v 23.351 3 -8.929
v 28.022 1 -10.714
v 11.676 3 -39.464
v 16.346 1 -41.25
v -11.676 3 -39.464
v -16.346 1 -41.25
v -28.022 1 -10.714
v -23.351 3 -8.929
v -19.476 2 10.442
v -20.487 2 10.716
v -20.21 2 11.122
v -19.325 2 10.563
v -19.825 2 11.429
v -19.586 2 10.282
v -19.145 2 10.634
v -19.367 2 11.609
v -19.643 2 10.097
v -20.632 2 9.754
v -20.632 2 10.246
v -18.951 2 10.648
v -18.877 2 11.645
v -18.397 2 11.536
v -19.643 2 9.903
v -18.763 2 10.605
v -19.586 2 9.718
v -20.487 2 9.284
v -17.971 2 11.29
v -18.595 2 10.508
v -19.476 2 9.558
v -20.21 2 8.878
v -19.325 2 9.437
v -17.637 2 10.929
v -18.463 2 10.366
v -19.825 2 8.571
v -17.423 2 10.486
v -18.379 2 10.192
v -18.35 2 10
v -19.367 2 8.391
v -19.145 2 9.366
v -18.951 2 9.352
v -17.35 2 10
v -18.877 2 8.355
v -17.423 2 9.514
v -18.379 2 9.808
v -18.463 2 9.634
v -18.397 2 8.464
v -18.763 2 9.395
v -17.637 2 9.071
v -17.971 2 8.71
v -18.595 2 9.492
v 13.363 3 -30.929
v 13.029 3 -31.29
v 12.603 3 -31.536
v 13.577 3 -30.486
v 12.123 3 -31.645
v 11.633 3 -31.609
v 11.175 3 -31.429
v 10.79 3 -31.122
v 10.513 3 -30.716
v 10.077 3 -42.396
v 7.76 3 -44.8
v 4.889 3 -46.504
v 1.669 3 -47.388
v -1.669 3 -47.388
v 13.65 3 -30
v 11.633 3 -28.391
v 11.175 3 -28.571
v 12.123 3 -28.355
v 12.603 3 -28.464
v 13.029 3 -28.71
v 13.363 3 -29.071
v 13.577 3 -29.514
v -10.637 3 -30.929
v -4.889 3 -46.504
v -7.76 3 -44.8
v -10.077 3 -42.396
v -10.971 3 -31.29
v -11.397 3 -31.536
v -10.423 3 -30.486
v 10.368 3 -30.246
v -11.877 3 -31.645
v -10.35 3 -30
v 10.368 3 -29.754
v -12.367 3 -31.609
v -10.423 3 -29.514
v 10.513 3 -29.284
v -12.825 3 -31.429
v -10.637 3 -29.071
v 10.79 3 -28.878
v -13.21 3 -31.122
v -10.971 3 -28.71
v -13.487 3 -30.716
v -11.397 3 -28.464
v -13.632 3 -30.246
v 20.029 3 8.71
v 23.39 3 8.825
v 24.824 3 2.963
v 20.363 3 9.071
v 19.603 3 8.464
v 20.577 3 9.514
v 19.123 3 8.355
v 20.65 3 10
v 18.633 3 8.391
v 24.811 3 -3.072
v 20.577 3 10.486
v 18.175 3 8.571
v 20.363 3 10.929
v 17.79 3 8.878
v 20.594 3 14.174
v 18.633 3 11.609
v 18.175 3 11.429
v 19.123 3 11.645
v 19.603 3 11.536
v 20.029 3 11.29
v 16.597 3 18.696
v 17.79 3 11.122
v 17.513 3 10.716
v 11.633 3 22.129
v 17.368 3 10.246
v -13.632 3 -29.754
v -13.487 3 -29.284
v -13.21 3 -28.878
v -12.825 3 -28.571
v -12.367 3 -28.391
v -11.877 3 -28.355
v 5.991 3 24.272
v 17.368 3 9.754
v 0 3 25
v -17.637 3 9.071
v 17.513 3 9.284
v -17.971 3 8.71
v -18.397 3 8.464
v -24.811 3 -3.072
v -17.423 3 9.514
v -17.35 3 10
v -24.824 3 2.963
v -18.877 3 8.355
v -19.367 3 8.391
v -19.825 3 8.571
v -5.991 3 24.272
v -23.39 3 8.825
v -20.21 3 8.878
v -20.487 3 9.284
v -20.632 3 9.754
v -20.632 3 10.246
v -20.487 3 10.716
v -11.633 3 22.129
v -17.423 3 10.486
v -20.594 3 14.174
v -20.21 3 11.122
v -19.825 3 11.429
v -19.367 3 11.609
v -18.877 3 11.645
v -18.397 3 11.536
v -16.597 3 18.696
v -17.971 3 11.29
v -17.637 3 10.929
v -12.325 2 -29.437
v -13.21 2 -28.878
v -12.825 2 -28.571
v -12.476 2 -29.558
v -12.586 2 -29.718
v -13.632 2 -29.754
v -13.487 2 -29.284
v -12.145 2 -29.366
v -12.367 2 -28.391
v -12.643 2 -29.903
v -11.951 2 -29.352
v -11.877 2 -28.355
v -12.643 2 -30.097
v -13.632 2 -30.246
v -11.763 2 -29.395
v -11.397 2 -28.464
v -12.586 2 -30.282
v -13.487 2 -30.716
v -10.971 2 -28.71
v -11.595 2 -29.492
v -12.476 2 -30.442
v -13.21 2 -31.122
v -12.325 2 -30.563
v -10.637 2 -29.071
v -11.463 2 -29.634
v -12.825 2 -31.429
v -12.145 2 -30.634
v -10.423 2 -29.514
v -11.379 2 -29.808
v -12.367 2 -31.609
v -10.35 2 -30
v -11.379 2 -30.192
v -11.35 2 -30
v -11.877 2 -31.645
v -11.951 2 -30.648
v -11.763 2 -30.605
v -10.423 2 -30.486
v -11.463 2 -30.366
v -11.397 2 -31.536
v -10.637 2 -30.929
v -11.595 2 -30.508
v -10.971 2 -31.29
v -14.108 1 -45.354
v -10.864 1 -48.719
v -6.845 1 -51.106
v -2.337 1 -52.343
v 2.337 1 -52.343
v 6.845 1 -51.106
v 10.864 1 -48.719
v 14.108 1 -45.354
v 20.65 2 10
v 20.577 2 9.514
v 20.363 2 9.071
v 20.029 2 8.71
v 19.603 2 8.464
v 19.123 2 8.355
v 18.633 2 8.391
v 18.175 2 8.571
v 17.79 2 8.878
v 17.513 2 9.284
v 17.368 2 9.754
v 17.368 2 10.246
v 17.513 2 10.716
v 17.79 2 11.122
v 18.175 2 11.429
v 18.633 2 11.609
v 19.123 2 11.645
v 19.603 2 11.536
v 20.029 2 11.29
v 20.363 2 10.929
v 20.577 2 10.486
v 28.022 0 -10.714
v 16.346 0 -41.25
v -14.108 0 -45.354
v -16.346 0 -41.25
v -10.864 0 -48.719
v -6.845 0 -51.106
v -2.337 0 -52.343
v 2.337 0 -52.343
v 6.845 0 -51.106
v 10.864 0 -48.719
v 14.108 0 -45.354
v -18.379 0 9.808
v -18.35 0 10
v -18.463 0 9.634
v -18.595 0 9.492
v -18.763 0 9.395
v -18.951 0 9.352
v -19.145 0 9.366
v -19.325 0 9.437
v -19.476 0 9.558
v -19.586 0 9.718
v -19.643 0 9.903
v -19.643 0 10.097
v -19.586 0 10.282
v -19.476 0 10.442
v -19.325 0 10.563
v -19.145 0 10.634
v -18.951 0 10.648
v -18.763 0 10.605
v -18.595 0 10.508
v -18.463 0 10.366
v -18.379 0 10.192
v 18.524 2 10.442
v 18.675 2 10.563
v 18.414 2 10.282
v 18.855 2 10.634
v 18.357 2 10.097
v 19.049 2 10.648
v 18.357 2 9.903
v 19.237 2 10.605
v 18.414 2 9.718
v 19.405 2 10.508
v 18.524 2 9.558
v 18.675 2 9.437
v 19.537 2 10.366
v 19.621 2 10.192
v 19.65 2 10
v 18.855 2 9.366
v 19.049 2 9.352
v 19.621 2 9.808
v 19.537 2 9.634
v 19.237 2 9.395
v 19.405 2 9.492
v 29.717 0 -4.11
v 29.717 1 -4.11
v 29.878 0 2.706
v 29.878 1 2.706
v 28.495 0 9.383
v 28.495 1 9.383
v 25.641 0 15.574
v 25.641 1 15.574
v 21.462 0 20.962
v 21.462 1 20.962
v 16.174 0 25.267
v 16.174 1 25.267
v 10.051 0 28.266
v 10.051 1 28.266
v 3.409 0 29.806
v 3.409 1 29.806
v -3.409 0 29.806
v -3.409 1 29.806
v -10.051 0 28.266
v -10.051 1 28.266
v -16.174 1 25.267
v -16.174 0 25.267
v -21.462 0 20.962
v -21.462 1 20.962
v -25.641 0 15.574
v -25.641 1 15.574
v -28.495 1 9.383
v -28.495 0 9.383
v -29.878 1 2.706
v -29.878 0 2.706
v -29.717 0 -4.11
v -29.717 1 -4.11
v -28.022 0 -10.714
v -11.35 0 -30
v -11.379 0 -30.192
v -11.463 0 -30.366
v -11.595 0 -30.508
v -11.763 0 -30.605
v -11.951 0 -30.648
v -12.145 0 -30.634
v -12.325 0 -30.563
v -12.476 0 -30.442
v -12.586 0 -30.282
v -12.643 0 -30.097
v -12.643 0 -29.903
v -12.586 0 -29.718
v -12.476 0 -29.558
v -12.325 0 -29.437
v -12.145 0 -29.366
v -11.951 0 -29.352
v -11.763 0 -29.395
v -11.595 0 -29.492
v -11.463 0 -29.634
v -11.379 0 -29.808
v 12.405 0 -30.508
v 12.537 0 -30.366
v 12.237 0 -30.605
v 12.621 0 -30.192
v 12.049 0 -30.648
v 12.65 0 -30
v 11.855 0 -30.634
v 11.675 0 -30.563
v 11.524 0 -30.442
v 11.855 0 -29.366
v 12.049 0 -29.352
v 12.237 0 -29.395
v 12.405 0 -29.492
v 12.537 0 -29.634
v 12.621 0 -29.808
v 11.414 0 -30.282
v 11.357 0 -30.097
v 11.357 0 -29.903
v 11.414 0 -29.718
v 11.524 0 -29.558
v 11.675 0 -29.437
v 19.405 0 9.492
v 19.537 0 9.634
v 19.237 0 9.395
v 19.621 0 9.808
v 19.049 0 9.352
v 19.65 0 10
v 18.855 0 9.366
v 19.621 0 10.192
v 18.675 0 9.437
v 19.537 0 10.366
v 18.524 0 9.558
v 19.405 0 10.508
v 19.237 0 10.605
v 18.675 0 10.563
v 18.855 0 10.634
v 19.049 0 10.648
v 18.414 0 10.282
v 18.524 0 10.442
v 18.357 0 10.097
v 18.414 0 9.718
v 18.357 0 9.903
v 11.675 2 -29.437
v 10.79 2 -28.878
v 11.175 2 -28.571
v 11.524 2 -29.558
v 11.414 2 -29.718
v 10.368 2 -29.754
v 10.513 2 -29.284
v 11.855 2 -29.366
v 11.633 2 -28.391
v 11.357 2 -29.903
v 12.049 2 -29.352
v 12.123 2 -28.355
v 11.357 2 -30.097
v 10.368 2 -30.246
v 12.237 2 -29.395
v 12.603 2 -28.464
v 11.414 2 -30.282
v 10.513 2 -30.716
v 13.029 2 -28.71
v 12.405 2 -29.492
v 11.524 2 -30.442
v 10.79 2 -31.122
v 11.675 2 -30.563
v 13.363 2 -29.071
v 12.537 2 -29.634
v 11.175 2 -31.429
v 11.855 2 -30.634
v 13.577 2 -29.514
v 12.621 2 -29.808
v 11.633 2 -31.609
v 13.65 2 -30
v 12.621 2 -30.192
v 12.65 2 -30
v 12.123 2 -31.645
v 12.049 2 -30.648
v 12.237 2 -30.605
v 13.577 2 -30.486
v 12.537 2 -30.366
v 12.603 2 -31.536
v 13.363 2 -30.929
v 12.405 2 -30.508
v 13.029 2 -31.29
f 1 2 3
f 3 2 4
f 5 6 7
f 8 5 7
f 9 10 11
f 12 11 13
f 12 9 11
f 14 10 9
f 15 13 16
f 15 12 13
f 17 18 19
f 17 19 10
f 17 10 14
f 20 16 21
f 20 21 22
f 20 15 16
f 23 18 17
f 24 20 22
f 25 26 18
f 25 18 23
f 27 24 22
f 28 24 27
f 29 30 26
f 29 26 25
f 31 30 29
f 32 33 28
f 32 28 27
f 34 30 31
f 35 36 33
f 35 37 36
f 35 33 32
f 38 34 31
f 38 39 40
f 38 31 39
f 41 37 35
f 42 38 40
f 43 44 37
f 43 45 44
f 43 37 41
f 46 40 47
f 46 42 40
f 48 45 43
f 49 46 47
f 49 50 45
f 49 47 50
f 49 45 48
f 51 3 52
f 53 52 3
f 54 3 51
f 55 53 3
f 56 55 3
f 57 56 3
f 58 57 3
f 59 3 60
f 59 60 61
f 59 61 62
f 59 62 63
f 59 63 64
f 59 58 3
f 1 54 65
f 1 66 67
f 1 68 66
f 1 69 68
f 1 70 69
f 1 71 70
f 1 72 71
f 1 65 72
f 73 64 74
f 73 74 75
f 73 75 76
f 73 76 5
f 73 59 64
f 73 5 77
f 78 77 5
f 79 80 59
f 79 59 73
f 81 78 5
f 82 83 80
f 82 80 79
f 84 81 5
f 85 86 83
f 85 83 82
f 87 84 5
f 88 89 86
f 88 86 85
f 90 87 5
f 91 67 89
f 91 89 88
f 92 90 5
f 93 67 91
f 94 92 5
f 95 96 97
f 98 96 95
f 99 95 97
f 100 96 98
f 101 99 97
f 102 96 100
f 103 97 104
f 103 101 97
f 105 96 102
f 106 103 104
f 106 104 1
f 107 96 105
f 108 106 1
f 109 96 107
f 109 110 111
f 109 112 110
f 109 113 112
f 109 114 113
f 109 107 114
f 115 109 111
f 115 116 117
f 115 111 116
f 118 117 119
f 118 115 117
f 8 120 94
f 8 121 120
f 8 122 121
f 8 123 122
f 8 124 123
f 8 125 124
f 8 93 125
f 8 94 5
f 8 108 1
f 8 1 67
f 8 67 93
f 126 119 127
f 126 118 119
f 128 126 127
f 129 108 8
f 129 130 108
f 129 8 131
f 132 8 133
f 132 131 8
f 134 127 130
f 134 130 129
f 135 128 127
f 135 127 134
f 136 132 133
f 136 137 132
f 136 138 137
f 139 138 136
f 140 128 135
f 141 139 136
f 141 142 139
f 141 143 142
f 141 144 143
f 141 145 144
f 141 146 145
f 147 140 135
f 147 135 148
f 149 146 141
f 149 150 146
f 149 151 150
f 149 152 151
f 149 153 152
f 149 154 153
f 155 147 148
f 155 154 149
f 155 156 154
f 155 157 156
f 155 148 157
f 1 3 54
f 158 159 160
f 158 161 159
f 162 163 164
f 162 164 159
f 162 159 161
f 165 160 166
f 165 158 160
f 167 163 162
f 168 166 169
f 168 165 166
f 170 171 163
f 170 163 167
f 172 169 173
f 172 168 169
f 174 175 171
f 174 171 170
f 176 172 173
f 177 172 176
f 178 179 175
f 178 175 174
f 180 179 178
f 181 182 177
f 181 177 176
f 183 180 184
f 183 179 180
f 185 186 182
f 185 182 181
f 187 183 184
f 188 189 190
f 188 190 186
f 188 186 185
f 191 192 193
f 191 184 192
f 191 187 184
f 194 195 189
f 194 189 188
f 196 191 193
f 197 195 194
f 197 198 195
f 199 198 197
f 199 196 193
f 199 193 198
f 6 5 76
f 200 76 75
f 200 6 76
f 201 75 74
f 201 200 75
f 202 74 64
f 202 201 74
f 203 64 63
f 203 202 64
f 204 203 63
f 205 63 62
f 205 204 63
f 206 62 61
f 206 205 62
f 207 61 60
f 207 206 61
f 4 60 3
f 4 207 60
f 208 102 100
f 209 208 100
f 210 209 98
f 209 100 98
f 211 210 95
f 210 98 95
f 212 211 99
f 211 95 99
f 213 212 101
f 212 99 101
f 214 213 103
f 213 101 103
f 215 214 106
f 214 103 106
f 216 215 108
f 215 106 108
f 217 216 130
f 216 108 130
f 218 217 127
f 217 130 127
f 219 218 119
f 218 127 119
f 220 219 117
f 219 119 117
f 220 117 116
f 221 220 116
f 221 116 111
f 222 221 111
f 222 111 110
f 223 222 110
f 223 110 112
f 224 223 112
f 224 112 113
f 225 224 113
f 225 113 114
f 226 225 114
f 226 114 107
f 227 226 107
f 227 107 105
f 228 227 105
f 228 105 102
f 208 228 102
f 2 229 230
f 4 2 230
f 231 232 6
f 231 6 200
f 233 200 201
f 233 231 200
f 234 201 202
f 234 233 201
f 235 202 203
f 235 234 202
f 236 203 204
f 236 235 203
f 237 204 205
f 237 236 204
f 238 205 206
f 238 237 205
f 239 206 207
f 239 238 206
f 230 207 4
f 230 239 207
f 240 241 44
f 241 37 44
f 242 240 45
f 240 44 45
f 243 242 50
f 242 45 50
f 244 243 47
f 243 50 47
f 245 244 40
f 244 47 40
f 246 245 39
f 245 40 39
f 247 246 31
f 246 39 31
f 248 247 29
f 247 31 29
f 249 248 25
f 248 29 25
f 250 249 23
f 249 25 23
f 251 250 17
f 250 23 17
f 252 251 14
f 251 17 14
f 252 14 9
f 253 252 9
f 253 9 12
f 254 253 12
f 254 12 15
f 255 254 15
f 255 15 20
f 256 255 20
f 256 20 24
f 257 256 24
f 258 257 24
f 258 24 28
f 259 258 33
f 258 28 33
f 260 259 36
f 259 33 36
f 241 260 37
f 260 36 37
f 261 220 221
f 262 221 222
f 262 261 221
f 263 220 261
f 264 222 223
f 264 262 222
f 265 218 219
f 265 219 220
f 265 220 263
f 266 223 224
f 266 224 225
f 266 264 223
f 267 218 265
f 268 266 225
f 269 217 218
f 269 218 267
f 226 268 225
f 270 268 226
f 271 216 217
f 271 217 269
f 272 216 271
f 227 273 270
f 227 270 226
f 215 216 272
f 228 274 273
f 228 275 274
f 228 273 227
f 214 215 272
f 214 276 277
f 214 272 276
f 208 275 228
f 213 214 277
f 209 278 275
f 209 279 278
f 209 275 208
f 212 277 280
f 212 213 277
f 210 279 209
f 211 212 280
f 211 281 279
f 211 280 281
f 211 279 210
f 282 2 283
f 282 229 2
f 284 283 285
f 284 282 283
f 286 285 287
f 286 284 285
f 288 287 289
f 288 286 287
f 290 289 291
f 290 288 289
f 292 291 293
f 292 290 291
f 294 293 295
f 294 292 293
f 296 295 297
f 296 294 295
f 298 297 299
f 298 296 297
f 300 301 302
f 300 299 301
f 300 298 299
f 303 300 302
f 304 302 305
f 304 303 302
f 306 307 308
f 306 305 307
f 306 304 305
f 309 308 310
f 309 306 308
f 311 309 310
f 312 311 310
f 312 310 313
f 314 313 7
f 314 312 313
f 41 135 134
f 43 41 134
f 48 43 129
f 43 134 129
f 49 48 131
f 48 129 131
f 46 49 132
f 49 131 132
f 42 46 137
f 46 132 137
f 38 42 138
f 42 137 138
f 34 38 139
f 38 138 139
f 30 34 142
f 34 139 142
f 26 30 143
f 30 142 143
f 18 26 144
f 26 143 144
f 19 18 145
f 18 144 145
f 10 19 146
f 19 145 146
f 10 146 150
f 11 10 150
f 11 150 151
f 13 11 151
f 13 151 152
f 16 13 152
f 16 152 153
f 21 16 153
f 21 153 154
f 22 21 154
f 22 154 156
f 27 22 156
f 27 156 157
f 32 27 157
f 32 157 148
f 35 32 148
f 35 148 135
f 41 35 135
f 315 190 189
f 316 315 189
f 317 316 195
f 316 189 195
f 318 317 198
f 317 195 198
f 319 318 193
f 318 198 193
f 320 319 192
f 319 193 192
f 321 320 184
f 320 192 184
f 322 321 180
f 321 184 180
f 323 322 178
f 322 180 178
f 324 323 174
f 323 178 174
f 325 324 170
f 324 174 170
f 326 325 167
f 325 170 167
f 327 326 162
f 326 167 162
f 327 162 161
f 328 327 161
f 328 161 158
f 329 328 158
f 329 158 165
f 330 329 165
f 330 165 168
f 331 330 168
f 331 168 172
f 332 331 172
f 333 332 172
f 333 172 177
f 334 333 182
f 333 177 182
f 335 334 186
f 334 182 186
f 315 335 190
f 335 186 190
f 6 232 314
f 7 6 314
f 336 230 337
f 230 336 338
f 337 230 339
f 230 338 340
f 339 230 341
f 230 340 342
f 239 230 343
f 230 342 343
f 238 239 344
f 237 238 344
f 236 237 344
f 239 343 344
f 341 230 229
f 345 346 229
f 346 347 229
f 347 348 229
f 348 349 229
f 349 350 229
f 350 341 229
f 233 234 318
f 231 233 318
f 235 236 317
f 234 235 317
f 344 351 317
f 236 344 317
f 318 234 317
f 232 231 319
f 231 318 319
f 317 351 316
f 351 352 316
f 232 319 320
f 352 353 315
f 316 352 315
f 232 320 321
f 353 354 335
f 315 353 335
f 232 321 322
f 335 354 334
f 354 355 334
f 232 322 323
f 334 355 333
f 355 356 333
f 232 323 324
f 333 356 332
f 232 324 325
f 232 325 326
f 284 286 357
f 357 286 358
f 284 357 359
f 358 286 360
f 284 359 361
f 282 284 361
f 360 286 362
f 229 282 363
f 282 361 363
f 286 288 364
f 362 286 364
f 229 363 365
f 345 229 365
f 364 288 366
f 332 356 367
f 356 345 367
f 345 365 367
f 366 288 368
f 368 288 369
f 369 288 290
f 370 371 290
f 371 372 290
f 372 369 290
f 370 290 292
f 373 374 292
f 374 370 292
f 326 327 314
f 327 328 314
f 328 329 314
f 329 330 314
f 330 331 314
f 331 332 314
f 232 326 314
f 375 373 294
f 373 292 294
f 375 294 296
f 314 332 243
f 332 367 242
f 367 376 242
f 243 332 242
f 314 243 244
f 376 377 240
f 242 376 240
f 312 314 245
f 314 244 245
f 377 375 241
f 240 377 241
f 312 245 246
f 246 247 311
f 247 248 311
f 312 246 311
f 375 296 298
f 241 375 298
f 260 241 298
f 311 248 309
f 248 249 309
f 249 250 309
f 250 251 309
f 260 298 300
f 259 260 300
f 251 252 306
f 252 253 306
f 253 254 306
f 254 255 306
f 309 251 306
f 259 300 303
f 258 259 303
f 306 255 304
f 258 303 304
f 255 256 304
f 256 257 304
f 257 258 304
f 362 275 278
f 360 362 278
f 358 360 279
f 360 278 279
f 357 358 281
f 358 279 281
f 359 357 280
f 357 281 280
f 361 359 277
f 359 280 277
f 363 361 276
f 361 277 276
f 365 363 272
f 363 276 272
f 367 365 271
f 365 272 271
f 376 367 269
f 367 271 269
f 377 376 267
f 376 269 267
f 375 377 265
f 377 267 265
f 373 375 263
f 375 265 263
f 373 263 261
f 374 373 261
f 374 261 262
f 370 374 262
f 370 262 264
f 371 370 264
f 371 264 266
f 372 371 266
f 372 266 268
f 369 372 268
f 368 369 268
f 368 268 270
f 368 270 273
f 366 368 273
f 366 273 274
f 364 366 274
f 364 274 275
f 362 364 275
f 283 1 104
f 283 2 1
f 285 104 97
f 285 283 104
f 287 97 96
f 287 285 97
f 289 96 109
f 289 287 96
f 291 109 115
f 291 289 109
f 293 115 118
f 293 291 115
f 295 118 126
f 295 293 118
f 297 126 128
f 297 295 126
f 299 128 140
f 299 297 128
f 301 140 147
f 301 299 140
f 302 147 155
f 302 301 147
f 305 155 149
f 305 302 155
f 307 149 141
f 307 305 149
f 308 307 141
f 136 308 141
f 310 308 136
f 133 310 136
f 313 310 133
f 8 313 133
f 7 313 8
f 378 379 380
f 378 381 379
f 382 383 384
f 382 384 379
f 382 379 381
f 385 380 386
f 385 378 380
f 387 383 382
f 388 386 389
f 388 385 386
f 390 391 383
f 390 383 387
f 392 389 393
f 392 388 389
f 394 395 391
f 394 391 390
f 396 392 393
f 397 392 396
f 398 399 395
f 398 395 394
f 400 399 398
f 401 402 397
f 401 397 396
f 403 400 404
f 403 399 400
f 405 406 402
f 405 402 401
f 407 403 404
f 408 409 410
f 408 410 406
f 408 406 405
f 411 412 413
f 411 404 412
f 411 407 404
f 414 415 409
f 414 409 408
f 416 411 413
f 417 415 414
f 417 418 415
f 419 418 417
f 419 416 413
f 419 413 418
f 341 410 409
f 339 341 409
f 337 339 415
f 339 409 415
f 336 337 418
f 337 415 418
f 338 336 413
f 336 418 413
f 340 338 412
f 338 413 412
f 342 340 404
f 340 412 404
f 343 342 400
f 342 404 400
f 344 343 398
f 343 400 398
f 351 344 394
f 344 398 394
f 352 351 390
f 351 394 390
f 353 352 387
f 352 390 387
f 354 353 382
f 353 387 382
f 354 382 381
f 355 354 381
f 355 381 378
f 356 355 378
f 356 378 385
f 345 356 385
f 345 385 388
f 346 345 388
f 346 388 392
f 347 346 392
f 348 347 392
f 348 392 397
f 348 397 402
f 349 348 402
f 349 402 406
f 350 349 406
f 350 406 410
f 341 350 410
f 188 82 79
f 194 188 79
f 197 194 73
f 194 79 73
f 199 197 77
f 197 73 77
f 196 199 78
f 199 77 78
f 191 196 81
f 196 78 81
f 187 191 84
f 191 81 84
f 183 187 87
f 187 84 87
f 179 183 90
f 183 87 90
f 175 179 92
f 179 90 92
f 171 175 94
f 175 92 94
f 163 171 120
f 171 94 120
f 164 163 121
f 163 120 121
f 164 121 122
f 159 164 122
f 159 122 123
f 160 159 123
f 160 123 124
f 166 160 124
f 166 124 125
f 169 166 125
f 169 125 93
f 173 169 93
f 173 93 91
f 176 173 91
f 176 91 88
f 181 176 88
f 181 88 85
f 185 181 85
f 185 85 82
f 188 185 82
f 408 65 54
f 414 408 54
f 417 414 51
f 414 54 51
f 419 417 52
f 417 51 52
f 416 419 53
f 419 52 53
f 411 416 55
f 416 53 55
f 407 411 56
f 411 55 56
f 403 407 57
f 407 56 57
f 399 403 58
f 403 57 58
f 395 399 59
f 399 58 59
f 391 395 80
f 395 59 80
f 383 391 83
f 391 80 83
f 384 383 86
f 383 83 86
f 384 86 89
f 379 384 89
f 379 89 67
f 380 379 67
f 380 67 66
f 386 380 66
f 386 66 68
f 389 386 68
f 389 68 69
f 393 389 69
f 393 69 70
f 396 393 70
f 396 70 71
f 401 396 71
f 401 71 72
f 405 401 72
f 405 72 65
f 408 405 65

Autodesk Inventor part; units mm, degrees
ref_plane "YZ Plane" through (0, 0, 0) normal (1, 0, 0) x (0, 1, 0)
ref_plane "XZ Plane" through (0, 0, 0) normal (0, 1, 0) x (-1, 0, 0)
ref_plane "XY Plane" through (0, 0, 0) normal (0, 0, 1) x (1, 0, 0)
sketch "Sketch1" plane through (0, 0, 0) normal (0, 1, 0) x (-1, 0, 0)
  arc A0 (28.0215, -10.7143) -> (-28.0215, -10.7143) centre (0, 0) ccw
  arc A1 (14.9976, -25.9821) -> (-16.3459, -41.25) centre (0, -35) ccw construction
  line L0 (0, 0) -> (0, -35) construction
  line L1 (-28.0215, -10.7143) -> (-16.3459, -41.25)
  line L2 (16.3459, -41.25) -> (28.0215, -10.7143)
  arc A2 (14.9976, -25.9821) -> (28.0215, -10.7143) centre (0, 0) ccw construction
  arc A3 (16.3459, -41.25) -> (14.9976, -25.9821) centre (0, -35) ccw construction
  arc A4 (-16.3459, -41.25) -> (16.3459, -41.25) centre (0, -35) ccw
  arc A5 (-28.0215, -10.7143) -> (14.9976, -25.9821) centre (0, 0) ccw construction
  dimension "d0" = 60
  dimension "d1" = 35
  dimension "d2" = 35
extrude "Extrusion1" add sketch "Sketch1" along normal blind 3
chamfer "Chamfer1" distance 5 distance2 2 4 edges at (0, 3, 30) (22.1837, 3, -25.9821) (0, 3, -52.5) (-22.1837, 3, -25.9821) measured on face at (1.8074, 3, 7.3223)
sketch "Sketch2" plane through (0, 3, 0) normal (0, 1, 0) x (1, 0, 0)
  line L0 (-19, -10) -> (19, -10) construction
  line L1 (19, -10) -> (12, 30) construction
  line L2 (12, 30) -> (-12, 30) construction
  line L3 (-12, 30) -> (-19, -10) construction
  circle A0 centre (-19, -10) radius 0.65
  circle A1 centre (19, -10) radius 0.65
  circle A2 centre (-12, 30) radius 0.65
  circle A3 centre (12, 30) radius 0.65
  point P0 (0, 0)
  dimension "d8" = 10
  dimension "d9" = 30
  dimension "d10" = 19
  dimension "d11" = 19
  dimension "d12" = 12
  dimension "d13" = 12
  dimension "d14" = 1.3
  dimension "d15" = 1.3
  dimension "d16" = 1.3
  dimension "d17" = 1.3
extrude "Extrusion2" cut sketch "Sketch2" against normal through all
sketch "Sketch3" plane through (0, 3, 0) normal (0, 1, 0) x (1, 0, 0)
  circle A0 centre (19, -10) radius 0.65 projected
  circle A1 centre (-19, -10) radius 0.65 projected
  arc A2 (-23.3512, 8.9286) -> (23.3512, 8.9286) centre (0, 0) ccw projected
  line L0 (11.6756, 39.4643) -> (23.3512, 8.9286) projected
  arc A3 (11.6756, 39.4643) -> (-11.6756, 39.4643) centre (0, 35) ccw projected
  line L1 (-23.3512, 8.9286) -> (-11.6756, 39.4643) projected
  circle A4 centre (-19, -10) radius 1.65
  circle A5 centre (19, -10) radius 1.65
  circle A6 centre (12, 30) radius 1.65
  circle A7 centre (-12, 30) radius 1.65
  circle A8 centre (-12, 30) radius 0.65 projected
  circle A9 centre (12, 30) radius 0.65 projected
  dimension "d20" = 3.3
  dimension "d21" = 3.3
  dimension "d22" = 3.3
  dimension "d23" = 3.3
extrude "Extrusion3" cut sketch "Sketch3" against normal blind 1 contours A0 | A1 | A4 | A5 | A6 | A7 | A8 | A9
equation "\"d11\" = d10"
equation "\"d13\" = d12"
equation "\"d21\" = d20"
equation "\"d22\" = d20"
equation "\"d23\" = d20"
properties part number "Arm_1_Cover"
